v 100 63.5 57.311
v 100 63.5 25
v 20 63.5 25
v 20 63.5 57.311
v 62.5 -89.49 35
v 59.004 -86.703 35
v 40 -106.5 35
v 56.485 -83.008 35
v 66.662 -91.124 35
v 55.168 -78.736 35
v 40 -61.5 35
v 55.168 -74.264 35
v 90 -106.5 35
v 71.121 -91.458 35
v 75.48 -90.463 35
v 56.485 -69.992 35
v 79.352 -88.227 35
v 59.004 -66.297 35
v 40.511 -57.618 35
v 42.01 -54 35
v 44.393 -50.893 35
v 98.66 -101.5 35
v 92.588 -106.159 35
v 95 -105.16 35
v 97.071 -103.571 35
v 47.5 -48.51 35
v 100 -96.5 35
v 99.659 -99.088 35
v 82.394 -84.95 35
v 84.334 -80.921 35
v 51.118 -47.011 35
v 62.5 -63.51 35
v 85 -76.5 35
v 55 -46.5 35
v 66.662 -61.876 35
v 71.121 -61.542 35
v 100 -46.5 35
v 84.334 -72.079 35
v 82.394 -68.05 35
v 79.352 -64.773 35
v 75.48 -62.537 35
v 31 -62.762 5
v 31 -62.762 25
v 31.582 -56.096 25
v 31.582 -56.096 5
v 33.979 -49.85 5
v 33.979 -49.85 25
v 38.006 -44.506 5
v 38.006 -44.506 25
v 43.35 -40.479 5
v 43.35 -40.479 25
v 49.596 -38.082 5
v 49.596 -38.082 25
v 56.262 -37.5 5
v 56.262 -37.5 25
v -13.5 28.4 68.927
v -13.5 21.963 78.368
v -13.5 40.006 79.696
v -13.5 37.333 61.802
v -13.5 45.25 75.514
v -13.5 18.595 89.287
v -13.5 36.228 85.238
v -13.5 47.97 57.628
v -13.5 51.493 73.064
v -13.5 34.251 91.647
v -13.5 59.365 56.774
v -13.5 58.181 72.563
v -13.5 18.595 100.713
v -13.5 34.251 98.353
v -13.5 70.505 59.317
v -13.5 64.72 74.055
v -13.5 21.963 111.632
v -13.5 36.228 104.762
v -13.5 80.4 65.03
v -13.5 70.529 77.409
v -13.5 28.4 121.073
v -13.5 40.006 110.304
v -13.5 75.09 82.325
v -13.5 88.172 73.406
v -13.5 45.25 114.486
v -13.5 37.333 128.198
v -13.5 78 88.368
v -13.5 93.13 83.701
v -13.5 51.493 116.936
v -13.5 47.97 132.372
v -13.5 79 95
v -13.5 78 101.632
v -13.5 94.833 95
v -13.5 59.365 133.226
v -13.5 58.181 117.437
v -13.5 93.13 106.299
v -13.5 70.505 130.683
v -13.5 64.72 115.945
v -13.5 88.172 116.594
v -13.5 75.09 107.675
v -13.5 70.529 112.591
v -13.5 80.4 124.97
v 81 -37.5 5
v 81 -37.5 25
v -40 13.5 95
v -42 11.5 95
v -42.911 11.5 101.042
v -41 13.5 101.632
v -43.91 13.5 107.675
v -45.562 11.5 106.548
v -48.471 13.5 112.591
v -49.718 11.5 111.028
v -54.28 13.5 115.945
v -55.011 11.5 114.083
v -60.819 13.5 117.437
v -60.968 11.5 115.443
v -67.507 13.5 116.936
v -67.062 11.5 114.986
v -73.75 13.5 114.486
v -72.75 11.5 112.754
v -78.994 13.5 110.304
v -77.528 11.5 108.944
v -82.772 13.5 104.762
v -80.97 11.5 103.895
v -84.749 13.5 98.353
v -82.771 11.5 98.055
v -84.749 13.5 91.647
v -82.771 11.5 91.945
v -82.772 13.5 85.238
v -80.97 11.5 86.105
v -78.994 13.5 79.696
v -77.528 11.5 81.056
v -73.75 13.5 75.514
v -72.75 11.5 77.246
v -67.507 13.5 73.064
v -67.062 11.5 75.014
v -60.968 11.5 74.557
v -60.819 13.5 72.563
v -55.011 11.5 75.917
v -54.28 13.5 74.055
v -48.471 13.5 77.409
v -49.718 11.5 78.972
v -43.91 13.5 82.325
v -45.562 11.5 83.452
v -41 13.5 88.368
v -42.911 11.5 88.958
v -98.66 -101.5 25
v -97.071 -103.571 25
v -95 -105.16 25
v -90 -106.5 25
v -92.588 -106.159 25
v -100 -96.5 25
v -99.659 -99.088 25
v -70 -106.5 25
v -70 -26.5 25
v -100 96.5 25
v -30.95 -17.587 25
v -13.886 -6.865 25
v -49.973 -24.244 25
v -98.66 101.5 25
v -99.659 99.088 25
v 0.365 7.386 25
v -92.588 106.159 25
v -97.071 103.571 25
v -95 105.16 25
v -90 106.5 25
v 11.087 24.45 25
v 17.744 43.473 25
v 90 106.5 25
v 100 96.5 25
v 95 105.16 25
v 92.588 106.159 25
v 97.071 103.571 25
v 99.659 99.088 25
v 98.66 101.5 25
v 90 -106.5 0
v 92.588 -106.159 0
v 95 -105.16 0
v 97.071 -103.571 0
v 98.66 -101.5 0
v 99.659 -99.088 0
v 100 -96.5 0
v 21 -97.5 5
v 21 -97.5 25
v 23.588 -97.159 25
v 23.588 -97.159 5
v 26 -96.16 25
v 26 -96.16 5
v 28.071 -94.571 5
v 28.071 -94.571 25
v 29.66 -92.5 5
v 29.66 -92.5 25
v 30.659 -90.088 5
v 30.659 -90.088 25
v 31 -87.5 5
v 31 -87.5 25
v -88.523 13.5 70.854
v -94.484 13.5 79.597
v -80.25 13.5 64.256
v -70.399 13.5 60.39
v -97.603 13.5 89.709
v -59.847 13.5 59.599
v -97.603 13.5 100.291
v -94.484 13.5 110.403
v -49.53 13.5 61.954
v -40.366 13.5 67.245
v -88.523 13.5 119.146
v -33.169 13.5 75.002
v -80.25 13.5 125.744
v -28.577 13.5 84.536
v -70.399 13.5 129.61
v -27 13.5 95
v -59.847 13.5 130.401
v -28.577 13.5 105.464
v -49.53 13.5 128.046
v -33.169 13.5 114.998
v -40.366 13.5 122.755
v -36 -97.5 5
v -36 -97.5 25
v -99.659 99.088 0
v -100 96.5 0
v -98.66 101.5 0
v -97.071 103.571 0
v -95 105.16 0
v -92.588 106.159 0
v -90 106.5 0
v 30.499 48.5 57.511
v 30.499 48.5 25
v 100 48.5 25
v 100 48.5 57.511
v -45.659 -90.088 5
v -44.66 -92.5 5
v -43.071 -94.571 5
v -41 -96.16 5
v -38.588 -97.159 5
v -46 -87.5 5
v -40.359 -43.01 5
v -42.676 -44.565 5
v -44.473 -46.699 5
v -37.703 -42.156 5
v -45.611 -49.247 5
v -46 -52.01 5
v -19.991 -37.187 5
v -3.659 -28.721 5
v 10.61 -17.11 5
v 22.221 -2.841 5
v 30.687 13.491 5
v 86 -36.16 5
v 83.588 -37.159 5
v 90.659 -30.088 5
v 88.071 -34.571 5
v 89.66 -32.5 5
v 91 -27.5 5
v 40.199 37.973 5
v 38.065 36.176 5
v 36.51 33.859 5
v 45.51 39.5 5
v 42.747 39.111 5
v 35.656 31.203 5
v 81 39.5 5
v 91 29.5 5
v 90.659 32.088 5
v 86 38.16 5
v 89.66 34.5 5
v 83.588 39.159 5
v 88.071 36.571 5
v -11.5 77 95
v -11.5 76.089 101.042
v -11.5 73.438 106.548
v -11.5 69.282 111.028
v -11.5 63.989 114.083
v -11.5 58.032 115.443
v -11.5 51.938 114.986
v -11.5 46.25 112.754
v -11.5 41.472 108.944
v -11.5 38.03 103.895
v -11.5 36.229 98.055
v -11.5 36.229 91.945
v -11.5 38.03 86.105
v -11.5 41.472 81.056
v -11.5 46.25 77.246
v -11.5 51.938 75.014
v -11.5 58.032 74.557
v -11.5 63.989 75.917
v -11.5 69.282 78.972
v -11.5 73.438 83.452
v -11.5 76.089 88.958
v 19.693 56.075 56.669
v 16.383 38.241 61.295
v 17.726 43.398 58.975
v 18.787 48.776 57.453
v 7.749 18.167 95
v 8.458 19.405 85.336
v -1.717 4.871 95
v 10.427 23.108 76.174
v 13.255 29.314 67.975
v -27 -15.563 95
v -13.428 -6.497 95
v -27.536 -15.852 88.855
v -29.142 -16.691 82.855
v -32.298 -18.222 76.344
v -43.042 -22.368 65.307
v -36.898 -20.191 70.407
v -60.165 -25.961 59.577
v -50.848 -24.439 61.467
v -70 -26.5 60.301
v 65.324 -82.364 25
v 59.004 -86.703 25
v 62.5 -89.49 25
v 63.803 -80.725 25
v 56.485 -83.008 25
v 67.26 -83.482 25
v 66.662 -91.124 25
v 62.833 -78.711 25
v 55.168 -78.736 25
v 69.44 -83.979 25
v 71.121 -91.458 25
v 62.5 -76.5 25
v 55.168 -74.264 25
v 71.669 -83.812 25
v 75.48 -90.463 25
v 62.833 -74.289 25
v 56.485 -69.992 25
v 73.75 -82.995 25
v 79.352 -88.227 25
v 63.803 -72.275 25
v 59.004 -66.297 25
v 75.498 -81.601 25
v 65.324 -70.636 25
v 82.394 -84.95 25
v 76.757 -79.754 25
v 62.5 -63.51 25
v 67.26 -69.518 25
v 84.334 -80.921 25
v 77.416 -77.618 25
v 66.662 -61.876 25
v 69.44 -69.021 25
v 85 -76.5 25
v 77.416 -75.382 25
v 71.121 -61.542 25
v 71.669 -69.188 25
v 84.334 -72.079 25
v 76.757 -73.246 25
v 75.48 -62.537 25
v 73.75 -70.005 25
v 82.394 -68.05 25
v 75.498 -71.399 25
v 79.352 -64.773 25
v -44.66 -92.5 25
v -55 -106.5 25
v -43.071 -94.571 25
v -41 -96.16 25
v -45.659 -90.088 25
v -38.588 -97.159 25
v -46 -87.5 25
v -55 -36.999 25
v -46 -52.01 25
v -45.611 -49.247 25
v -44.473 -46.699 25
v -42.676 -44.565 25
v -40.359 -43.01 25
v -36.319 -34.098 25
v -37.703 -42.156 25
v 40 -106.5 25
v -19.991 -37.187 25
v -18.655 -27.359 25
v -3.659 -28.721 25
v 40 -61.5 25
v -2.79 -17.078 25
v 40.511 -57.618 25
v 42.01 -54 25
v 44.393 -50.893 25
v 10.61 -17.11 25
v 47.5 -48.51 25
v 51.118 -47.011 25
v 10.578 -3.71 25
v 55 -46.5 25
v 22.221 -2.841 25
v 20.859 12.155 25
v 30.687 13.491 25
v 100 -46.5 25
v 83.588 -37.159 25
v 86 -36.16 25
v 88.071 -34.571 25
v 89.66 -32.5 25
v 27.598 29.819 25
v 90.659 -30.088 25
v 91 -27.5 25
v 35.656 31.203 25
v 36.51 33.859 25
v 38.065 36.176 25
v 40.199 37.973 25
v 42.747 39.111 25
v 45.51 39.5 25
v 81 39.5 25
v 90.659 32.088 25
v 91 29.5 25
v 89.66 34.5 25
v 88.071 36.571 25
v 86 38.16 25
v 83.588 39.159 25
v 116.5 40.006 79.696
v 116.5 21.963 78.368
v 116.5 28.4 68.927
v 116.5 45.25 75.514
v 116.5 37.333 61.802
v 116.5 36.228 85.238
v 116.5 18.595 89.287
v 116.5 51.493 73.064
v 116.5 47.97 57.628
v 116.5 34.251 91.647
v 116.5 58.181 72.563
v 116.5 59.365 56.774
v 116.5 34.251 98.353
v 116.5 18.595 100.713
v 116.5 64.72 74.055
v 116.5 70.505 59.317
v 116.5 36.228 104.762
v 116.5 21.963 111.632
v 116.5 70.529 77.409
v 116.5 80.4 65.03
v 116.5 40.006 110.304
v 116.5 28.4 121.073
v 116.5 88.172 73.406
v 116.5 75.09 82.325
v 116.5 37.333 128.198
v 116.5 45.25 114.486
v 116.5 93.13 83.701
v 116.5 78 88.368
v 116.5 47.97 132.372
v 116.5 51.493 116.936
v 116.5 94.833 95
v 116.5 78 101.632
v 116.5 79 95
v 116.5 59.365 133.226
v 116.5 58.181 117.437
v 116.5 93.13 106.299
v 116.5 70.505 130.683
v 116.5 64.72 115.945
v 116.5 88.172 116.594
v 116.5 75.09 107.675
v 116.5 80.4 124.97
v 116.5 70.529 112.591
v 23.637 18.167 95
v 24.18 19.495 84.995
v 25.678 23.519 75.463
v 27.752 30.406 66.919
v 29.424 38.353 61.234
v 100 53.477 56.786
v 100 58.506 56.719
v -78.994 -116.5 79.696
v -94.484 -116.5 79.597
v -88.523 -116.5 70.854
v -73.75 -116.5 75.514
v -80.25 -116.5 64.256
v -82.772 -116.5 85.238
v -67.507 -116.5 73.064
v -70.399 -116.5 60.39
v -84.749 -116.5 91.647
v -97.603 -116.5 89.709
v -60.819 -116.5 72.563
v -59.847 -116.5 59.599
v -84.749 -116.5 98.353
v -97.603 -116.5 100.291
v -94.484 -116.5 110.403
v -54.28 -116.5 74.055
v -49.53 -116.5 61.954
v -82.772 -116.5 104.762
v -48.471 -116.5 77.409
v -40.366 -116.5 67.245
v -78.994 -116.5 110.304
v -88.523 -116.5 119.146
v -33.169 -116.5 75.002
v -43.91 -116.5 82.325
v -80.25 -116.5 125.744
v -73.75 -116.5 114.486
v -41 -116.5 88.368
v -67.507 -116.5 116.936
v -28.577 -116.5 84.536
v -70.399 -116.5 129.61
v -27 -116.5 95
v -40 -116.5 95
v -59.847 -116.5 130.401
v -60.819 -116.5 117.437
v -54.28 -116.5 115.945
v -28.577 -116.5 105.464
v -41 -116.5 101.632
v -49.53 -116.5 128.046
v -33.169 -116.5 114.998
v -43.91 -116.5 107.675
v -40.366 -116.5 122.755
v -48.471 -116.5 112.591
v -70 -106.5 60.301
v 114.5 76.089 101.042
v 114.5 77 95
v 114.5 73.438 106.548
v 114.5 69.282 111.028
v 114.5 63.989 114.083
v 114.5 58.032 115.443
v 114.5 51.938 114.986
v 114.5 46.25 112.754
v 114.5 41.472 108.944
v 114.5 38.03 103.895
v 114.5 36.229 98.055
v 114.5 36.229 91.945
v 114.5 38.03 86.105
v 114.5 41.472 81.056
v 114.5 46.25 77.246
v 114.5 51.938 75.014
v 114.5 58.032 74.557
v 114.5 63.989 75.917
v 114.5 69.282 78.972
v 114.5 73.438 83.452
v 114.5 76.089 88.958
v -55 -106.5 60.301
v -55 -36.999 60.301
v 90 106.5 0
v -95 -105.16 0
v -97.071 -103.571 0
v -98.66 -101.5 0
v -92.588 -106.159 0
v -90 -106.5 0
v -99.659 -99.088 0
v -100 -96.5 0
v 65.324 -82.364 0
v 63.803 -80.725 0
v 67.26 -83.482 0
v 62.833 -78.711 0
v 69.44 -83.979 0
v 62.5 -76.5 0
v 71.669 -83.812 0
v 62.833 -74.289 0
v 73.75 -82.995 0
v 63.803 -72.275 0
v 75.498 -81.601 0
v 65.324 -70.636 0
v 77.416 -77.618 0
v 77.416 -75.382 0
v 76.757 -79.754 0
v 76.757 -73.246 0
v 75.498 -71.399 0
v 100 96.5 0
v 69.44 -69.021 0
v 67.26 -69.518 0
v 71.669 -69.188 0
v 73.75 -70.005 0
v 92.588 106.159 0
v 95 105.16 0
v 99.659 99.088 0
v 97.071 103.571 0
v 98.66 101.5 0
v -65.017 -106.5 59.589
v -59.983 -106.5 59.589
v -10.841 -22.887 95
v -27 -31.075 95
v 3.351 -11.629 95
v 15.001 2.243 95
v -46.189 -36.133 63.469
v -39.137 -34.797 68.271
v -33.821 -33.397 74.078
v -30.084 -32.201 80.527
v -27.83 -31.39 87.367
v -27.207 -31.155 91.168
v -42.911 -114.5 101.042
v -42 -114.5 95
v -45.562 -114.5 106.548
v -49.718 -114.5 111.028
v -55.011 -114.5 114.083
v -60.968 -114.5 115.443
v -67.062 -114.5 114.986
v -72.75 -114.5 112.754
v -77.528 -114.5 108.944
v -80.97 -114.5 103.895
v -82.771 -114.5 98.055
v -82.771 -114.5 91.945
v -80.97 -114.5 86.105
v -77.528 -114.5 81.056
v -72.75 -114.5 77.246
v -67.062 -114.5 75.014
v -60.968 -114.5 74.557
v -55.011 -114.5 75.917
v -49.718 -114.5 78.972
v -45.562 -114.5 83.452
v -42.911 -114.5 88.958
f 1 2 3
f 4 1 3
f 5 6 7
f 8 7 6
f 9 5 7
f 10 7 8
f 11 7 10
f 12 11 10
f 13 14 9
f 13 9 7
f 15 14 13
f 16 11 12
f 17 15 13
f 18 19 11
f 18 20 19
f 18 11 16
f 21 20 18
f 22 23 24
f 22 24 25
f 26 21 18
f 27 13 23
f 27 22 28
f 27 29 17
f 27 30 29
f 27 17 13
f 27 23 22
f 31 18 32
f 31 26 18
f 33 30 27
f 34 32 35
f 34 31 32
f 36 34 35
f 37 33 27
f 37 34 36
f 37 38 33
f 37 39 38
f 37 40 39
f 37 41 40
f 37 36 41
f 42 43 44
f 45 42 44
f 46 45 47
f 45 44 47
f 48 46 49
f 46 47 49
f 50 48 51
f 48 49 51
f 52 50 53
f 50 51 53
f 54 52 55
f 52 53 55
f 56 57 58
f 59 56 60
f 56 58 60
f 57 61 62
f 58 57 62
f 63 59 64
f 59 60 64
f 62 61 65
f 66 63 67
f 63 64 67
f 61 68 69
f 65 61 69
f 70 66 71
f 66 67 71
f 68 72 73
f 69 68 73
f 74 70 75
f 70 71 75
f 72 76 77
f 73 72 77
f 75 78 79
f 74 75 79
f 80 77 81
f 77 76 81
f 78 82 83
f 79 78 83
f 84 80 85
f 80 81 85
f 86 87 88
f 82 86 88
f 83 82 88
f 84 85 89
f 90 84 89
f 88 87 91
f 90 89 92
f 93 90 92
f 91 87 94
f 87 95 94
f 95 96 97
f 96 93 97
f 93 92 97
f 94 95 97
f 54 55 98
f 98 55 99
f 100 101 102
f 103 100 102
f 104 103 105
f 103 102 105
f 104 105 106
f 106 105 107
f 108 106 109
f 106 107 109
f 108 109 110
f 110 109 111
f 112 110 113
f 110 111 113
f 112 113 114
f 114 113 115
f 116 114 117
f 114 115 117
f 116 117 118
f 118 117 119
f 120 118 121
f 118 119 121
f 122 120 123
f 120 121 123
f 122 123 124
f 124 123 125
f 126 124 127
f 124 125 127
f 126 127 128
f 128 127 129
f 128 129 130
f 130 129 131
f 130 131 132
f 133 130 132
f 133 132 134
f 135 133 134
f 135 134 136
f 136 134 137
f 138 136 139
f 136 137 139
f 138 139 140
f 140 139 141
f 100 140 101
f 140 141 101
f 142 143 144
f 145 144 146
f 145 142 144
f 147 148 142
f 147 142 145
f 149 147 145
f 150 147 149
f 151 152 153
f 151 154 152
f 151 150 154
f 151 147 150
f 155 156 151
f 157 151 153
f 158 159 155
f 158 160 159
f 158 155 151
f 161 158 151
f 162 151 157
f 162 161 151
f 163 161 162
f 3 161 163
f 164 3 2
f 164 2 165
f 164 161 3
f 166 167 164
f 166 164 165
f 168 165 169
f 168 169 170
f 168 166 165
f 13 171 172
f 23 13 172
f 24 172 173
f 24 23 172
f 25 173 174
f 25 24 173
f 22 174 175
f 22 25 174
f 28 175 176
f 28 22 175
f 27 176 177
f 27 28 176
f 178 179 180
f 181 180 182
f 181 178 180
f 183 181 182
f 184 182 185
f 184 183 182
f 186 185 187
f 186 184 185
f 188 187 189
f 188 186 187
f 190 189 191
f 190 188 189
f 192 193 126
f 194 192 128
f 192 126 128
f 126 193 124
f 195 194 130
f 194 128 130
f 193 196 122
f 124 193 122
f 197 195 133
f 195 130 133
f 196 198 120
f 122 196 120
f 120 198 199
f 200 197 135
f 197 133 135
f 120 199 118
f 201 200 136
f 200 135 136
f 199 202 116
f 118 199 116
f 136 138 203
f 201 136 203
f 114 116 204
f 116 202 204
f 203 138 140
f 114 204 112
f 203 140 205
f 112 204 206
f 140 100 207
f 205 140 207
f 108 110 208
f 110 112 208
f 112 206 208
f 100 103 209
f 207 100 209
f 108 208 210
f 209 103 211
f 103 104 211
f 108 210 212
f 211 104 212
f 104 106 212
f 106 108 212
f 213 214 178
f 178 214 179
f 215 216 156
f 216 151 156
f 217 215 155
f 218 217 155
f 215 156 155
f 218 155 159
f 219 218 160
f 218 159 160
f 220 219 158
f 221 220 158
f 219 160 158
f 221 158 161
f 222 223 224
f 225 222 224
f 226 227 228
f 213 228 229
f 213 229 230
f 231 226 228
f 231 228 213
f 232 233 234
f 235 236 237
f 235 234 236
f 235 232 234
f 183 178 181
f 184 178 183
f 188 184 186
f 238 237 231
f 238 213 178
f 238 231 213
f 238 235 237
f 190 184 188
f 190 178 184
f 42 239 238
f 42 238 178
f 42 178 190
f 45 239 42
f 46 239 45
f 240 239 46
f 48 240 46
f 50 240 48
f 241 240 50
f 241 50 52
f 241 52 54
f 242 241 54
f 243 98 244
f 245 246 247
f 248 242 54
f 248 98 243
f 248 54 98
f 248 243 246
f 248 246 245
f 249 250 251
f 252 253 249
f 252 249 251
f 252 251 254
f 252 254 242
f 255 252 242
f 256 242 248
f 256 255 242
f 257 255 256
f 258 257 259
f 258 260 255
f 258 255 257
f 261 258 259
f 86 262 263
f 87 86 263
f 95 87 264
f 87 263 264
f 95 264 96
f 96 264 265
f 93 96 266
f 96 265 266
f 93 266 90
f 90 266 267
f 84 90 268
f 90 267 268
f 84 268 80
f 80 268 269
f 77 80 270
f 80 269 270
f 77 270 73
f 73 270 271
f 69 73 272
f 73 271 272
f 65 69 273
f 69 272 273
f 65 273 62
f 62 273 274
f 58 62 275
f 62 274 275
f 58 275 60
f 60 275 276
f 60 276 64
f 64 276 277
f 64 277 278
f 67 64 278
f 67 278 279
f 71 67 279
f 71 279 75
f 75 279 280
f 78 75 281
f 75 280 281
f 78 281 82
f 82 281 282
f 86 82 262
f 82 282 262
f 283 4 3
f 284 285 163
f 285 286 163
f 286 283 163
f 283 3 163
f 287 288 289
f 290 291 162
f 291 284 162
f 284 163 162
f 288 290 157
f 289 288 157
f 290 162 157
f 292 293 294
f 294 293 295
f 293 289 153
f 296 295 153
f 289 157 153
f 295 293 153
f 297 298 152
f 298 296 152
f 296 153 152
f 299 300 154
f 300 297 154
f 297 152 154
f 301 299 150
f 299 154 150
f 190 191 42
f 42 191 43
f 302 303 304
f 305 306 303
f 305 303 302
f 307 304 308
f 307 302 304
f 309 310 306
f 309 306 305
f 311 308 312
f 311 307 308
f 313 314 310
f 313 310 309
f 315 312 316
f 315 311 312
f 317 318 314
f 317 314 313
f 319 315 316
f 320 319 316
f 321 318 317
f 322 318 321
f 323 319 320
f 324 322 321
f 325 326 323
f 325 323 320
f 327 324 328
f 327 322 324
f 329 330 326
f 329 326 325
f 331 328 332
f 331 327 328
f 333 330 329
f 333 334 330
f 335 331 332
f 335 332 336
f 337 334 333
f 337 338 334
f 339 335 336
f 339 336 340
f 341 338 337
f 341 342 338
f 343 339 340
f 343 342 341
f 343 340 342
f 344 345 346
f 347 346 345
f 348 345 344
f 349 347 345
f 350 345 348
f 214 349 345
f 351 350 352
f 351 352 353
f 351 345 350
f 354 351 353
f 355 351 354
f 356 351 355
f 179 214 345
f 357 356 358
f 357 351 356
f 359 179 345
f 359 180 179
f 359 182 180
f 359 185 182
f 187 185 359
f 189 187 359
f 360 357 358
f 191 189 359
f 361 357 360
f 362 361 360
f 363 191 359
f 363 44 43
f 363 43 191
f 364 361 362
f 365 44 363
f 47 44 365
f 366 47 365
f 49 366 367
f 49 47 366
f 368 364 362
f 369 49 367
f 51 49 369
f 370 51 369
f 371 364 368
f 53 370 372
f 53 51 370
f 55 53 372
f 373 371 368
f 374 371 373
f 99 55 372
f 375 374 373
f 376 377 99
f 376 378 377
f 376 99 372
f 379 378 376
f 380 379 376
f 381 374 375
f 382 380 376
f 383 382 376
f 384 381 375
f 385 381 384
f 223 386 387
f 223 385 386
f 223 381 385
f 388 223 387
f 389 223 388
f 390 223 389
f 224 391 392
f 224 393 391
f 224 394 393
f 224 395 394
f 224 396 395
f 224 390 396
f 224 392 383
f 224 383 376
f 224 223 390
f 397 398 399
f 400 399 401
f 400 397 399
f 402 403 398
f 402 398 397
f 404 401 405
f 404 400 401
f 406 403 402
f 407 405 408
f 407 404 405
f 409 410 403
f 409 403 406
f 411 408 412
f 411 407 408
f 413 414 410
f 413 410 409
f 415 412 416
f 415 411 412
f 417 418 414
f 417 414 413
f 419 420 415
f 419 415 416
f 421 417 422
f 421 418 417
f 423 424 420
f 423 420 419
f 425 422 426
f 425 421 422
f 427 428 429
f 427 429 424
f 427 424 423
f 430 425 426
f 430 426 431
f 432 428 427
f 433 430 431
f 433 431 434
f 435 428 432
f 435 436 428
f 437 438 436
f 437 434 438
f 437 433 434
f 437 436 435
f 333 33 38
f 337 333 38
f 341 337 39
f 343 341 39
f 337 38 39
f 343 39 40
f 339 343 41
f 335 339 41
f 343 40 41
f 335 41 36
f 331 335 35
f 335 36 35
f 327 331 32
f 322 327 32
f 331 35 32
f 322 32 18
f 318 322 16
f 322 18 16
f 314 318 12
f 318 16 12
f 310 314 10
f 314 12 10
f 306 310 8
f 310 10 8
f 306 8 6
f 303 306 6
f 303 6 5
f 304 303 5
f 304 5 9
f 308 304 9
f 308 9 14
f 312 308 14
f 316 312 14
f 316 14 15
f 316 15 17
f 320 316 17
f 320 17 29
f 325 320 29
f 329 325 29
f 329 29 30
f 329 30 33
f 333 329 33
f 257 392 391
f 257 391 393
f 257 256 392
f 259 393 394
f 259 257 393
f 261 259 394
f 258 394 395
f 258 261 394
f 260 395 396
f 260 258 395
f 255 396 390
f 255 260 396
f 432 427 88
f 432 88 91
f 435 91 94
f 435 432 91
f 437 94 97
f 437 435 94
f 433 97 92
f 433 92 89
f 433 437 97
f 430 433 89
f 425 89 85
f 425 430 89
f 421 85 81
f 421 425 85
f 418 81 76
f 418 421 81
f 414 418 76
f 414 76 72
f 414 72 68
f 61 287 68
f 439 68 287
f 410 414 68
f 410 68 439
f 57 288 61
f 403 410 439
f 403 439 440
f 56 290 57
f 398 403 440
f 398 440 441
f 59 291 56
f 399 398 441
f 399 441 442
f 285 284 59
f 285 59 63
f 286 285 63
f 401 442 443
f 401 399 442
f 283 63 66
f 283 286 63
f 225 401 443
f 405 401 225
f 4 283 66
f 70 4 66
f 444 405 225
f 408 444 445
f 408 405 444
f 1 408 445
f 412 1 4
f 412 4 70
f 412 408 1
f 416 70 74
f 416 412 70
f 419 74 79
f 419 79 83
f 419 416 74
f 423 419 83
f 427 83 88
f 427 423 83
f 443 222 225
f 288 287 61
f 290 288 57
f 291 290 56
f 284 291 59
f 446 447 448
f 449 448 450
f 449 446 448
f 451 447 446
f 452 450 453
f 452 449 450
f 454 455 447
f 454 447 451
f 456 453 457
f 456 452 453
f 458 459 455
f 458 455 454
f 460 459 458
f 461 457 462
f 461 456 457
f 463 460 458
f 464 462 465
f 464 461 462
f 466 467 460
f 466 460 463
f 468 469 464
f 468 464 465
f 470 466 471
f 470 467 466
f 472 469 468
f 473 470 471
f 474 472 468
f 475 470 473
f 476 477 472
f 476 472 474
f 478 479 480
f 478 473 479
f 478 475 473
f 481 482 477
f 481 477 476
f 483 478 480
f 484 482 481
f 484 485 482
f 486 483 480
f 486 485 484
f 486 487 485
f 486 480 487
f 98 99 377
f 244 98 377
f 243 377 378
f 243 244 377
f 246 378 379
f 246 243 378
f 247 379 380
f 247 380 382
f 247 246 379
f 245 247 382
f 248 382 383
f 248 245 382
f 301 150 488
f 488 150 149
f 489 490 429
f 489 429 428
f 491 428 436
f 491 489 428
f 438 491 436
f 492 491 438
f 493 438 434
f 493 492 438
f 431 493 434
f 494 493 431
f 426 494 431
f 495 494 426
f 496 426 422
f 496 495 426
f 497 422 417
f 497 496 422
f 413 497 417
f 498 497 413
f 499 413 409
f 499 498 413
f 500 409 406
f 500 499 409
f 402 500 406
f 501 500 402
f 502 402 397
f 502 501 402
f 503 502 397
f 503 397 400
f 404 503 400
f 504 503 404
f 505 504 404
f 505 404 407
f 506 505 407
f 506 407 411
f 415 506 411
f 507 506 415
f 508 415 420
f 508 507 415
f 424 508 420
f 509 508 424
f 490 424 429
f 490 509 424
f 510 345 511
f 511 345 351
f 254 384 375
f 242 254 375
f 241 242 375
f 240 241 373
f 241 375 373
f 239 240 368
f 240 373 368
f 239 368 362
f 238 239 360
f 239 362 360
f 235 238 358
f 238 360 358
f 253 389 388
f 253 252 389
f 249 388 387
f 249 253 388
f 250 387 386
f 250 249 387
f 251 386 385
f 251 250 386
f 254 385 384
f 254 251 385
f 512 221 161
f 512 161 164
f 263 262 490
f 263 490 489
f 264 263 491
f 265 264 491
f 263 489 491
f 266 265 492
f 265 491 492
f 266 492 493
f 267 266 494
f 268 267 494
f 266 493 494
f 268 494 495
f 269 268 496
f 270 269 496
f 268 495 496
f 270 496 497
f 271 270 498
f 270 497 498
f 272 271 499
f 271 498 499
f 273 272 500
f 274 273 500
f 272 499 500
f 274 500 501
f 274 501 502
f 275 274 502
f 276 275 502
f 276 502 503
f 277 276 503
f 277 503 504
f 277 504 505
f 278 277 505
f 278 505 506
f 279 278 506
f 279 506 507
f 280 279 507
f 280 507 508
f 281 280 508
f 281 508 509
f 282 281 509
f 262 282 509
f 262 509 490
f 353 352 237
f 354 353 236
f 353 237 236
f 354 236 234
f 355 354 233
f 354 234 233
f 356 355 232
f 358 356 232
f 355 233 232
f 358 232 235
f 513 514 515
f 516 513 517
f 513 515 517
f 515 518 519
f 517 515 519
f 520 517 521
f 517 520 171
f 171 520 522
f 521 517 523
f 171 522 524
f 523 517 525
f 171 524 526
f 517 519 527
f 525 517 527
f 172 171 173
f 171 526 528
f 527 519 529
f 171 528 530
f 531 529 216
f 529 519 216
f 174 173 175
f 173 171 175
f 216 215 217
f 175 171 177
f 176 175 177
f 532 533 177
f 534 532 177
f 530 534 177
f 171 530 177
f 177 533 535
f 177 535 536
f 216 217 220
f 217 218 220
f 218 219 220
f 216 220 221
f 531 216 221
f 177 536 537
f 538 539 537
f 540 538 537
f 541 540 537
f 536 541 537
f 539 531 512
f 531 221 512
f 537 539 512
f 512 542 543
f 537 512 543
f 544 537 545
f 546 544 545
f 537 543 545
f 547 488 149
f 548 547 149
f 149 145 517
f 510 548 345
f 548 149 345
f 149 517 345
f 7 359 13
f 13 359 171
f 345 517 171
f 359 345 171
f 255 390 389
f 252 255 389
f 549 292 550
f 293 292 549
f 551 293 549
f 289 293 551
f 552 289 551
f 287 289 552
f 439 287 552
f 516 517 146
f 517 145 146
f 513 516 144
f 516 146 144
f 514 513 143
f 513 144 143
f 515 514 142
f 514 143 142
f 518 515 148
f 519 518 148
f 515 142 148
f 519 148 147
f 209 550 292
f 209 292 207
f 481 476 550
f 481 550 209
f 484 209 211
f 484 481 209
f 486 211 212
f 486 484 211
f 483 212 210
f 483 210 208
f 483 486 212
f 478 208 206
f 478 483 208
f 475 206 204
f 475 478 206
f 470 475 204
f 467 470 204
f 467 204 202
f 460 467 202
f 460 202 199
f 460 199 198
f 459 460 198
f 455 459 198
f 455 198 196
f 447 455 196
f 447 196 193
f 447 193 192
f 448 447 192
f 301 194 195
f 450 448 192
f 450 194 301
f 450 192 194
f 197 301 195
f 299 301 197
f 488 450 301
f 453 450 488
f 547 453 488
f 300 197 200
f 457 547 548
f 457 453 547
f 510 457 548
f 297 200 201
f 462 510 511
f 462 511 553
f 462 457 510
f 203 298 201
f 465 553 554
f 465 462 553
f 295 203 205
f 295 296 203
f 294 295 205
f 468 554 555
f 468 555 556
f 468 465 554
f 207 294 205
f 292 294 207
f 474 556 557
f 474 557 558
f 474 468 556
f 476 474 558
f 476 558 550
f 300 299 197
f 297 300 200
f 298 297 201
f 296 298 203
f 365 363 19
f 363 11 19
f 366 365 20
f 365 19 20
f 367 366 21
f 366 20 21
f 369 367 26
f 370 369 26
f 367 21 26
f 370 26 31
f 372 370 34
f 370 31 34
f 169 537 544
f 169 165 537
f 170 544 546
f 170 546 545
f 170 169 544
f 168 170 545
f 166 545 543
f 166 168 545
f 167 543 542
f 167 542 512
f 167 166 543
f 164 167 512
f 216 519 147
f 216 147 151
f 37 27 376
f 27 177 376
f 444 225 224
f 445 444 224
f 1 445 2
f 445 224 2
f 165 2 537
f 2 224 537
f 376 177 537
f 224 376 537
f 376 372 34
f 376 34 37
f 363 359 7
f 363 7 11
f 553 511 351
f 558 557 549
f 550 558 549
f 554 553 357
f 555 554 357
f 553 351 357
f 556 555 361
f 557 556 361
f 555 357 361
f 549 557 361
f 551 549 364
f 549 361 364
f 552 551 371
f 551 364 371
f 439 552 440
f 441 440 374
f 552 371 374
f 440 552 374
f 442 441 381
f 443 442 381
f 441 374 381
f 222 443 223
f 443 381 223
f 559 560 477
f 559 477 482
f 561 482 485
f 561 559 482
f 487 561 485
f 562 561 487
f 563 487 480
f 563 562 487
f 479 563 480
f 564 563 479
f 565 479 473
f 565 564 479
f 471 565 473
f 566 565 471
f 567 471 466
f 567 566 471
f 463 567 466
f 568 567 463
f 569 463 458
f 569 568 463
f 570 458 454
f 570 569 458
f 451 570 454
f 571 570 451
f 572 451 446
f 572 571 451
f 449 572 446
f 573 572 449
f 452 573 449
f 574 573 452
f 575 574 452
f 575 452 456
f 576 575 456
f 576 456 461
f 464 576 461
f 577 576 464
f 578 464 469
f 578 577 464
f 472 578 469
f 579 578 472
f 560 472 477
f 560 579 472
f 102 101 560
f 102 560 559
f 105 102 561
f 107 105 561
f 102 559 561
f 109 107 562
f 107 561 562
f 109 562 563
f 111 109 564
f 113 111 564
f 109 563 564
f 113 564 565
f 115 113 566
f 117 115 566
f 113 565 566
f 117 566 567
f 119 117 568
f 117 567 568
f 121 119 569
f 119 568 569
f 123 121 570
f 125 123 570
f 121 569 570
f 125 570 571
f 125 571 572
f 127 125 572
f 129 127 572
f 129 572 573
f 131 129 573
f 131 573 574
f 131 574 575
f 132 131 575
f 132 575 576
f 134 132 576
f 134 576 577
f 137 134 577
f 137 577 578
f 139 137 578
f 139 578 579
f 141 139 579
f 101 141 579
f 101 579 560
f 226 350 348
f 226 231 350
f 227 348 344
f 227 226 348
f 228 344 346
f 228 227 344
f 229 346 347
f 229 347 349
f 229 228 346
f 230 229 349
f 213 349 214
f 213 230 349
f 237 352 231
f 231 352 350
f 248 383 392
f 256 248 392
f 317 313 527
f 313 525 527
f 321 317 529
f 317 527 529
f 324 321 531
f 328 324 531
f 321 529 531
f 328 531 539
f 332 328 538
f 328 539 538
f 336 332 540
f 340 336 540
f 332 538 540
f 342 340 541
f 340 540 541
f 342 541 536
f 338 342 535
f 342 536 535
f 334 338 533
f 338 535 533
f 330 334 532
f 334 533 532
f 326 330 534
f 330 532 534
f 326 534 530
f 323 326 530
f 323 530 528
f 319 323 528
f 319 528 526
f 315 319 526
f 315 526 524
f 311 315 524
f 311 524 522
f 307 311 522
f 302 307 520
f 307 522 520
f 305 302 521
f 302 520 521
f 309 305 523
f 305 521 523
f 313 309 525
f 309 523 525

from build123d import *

# Parameters (mm, degrees)
F0_W            = 200
F0_H            = 213
F1_DEPTH        = 25
F3_DEPTH        = 70
F5_R            = 35.5
F6_DEPTH        = 130
F8_R            = 38.333334
F9_DEPTH        = 130
F10_R           = 20.5
F11_DEPTH       = 216.501
F12_R           = 20.5
F13_DEPTH       = 223.001
F14_W           = 60
F14_H           = 60
F15_DEPTH       = 10
F17_D           = 15
F17_CBORE_D     = 30
F17_CBORE_DEPTH = 10
F18_R           = 10
F19_R           = 15
F21_DEPTH       = 20
F22_R           = 10
F23_SIZE2       = 2
F23_SIZE        = 2


with BuildPart() as f1:
    # F0 (on Top) → F1 (new body)
    with BuildSketch(Plane.XY):
        Rectangle(F0_W, F0_H)
    extrude(amount=F1_DEPTH)

    # F2 (on face) → F3 (join)
    with BuildSketch(Plane.XY.offset(25)):
        with BuildLine():
            Line((-70, -26.5), (-70, -106.5))
            Line((-70, -106.5), (-55, -106.5))
            Line((-55, -106.5), (-55, -36.999305))
            ThreePointArc((-55, -36.999305), (4.246212, -10.746212), (30.499305, 48.5))
            Line((30.499305, 48.5), (100, 48.5))
            Line((100, 48.5), (100, 63.5))
            Line((100, 63.5), (20, 63.5))
            ThreePointArc((20, 63.5), (-6.36039, -0.13961), (-70, -26.5))
        make_face()
    extrude(amount=F3_DEPTH)

    # F5 (on offset) → F6 (join)
    with BuildSketch(Plane.XZ.offset(116.5)):
        with Locations((-62.5, 95)):
            Circle(F5_R)
    extrude(amount=-F6_DEPTH)

    # F8 (on offset) → F9 (join)
    with BuildSketch(Plane.YZ.offset(116.5)):
        with Locations((56.5, 95)):
            Circle(F8_R)
    extrude(amount=-F9_DEPTH)

    # F10 (on face) → F11 (cut, through all)
    with BuildSketch(Plane.YZ.offset(116.5)):
        with Locations((56.5, 95)):
            Circle(F10_R)
    extrude(amount=-F11_DEPTH, mode=Mode.SUBTRACT)

    # F12 (on face) → F13 (cut, through all)
    with BuildSketch(Plane.XZ.offset(116.5)):
        with Locations((-62.5, 95)):
            Circle(F12_R)
    extrude(amount=-F13_DEPTH, mode=Mode.SUBTRACT)

    # F14 (on face) → F15 (join)
    with BuildSketch(Plane.XY.offset(25)):
        with Locations((70, -76.5)):
            Rectangle(F14_W, F14_H)
    extrude(amount=F15_DEPTH)

    # F17 (through all)
    with Locations(Plane.XY.offset(35)):
        with Locations((70, -76.5)):
            CounterBoreHole(F17_D / 2, F17_CBORE_D / 2, F17_CBORE_DEPTH)

    # F18
    f18_edges = [f1.edges().sort_by_distance(p)[0] for p in [
        (100, 106.5, 12.5),
        (100, -106.5, 17.5),
        (-100, -106.5, 12.5),
        (-100, 106.5, 12.5),
    ]]
    fillet(f18_edges, radius=F18_R)

    # F19
    f19_edges = [f1.edges().sort_by_distance(p)[0] for p in [
        (40, -46.5, 30),
    ]]
    fillet(f19_edges, radius=F19_R)

    # F20 (on face) → F21 (cut)
    with BuildSketch(Plane.XY.offset(25)):
        with BuildLine():
            Line((-46, -43.195626), (-46, -97.5))
            Line((-46, -97.5), (31, -97.5))
            Line((31, -97.5), (31, -62.762026))
            ThreePointArc((31, -62.762026), (38.005991, -44.505991), (56.262026, -37.5))
            Line((56.262026, -37.5), (91, -37.5))
            Line((91, -37.5), (91, 39.5))
            Line((91, 39.5), (36.695626, 39.5))
            ThreePointArc((36.695626, 39.5), (10.610173, -17.110173), (-46, -43.195626))
        make_face()
    extrude(amount=-F21_DEPTH, mode=Mode.SUBTRACT)

    # F22
    f22_edges = [f1.edges().sort_by_distance(p)[0] for p in [
        (36.695626, 39.5, 15),
        (-46, -43.195626, 15),
        (91, 39.5, 15),
        (91, -37.5, 15),
        (31, -97.5, 15),
        (-46, -97.5, 15),
    ]]
    fillet(f22_edges, radius=F22_R)

    # F23
    f23_edges = [f1.edges().sort_by_distance(p)[0] for p in [
        (-83, -116.5, 95),
        (116.5, 36, 95),
        (-13.5, 36, 95),
        (-83, 13.5, 95),
    ]]
    chamfer(f23_edges, length=F23_SIZE, length2=F23_SIZE2)


solid = f1.part
